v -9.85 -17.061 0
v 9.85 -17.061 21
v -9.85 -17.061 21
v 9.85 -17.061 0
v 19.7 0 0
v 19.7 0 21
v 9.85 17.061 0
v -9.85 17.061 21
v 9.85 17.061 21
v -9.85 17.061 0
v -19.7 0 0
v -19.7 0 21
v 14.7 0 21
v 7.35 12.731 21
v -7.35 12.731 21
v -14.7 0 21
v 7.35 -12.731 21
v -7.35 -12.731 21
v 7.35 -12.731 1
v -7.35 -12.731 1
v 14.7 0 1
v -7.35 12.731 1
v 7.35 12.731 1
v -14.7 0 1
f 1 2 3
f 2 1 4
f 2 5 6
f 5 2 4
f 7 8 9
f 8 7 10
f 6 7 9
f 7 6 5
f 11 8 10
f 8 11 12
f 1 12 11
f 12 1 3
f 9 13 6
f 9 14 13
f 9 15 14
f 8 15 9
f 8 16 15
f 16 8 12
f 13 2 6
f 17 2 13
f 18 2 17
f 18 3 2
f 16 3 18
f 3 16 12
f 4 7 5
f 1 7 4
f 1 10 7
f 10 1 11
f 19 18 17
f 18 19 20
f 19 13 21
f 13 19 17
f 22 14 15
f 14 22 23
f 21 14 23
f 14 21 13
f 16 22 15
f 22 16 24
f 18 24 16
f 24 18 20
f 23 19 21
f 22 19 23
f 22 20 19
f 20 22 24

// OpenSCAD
// Wall thickness
walls = 5;
// Bottom thickness
bottom = 1;
// Height
height = 20;
// Diameter
diameter = 29.4;

/* [Hidden] */
radius = diameter / 2;
totalHeight = bottom + height;
outerRadius = radius + walls;

$fn = 6;

difference() {
  cylinder(r = outerRadius, h = totalHeight);
  translate([0, 0, bottom])
    cylinder(r = radius, h = totalHeight);
}
